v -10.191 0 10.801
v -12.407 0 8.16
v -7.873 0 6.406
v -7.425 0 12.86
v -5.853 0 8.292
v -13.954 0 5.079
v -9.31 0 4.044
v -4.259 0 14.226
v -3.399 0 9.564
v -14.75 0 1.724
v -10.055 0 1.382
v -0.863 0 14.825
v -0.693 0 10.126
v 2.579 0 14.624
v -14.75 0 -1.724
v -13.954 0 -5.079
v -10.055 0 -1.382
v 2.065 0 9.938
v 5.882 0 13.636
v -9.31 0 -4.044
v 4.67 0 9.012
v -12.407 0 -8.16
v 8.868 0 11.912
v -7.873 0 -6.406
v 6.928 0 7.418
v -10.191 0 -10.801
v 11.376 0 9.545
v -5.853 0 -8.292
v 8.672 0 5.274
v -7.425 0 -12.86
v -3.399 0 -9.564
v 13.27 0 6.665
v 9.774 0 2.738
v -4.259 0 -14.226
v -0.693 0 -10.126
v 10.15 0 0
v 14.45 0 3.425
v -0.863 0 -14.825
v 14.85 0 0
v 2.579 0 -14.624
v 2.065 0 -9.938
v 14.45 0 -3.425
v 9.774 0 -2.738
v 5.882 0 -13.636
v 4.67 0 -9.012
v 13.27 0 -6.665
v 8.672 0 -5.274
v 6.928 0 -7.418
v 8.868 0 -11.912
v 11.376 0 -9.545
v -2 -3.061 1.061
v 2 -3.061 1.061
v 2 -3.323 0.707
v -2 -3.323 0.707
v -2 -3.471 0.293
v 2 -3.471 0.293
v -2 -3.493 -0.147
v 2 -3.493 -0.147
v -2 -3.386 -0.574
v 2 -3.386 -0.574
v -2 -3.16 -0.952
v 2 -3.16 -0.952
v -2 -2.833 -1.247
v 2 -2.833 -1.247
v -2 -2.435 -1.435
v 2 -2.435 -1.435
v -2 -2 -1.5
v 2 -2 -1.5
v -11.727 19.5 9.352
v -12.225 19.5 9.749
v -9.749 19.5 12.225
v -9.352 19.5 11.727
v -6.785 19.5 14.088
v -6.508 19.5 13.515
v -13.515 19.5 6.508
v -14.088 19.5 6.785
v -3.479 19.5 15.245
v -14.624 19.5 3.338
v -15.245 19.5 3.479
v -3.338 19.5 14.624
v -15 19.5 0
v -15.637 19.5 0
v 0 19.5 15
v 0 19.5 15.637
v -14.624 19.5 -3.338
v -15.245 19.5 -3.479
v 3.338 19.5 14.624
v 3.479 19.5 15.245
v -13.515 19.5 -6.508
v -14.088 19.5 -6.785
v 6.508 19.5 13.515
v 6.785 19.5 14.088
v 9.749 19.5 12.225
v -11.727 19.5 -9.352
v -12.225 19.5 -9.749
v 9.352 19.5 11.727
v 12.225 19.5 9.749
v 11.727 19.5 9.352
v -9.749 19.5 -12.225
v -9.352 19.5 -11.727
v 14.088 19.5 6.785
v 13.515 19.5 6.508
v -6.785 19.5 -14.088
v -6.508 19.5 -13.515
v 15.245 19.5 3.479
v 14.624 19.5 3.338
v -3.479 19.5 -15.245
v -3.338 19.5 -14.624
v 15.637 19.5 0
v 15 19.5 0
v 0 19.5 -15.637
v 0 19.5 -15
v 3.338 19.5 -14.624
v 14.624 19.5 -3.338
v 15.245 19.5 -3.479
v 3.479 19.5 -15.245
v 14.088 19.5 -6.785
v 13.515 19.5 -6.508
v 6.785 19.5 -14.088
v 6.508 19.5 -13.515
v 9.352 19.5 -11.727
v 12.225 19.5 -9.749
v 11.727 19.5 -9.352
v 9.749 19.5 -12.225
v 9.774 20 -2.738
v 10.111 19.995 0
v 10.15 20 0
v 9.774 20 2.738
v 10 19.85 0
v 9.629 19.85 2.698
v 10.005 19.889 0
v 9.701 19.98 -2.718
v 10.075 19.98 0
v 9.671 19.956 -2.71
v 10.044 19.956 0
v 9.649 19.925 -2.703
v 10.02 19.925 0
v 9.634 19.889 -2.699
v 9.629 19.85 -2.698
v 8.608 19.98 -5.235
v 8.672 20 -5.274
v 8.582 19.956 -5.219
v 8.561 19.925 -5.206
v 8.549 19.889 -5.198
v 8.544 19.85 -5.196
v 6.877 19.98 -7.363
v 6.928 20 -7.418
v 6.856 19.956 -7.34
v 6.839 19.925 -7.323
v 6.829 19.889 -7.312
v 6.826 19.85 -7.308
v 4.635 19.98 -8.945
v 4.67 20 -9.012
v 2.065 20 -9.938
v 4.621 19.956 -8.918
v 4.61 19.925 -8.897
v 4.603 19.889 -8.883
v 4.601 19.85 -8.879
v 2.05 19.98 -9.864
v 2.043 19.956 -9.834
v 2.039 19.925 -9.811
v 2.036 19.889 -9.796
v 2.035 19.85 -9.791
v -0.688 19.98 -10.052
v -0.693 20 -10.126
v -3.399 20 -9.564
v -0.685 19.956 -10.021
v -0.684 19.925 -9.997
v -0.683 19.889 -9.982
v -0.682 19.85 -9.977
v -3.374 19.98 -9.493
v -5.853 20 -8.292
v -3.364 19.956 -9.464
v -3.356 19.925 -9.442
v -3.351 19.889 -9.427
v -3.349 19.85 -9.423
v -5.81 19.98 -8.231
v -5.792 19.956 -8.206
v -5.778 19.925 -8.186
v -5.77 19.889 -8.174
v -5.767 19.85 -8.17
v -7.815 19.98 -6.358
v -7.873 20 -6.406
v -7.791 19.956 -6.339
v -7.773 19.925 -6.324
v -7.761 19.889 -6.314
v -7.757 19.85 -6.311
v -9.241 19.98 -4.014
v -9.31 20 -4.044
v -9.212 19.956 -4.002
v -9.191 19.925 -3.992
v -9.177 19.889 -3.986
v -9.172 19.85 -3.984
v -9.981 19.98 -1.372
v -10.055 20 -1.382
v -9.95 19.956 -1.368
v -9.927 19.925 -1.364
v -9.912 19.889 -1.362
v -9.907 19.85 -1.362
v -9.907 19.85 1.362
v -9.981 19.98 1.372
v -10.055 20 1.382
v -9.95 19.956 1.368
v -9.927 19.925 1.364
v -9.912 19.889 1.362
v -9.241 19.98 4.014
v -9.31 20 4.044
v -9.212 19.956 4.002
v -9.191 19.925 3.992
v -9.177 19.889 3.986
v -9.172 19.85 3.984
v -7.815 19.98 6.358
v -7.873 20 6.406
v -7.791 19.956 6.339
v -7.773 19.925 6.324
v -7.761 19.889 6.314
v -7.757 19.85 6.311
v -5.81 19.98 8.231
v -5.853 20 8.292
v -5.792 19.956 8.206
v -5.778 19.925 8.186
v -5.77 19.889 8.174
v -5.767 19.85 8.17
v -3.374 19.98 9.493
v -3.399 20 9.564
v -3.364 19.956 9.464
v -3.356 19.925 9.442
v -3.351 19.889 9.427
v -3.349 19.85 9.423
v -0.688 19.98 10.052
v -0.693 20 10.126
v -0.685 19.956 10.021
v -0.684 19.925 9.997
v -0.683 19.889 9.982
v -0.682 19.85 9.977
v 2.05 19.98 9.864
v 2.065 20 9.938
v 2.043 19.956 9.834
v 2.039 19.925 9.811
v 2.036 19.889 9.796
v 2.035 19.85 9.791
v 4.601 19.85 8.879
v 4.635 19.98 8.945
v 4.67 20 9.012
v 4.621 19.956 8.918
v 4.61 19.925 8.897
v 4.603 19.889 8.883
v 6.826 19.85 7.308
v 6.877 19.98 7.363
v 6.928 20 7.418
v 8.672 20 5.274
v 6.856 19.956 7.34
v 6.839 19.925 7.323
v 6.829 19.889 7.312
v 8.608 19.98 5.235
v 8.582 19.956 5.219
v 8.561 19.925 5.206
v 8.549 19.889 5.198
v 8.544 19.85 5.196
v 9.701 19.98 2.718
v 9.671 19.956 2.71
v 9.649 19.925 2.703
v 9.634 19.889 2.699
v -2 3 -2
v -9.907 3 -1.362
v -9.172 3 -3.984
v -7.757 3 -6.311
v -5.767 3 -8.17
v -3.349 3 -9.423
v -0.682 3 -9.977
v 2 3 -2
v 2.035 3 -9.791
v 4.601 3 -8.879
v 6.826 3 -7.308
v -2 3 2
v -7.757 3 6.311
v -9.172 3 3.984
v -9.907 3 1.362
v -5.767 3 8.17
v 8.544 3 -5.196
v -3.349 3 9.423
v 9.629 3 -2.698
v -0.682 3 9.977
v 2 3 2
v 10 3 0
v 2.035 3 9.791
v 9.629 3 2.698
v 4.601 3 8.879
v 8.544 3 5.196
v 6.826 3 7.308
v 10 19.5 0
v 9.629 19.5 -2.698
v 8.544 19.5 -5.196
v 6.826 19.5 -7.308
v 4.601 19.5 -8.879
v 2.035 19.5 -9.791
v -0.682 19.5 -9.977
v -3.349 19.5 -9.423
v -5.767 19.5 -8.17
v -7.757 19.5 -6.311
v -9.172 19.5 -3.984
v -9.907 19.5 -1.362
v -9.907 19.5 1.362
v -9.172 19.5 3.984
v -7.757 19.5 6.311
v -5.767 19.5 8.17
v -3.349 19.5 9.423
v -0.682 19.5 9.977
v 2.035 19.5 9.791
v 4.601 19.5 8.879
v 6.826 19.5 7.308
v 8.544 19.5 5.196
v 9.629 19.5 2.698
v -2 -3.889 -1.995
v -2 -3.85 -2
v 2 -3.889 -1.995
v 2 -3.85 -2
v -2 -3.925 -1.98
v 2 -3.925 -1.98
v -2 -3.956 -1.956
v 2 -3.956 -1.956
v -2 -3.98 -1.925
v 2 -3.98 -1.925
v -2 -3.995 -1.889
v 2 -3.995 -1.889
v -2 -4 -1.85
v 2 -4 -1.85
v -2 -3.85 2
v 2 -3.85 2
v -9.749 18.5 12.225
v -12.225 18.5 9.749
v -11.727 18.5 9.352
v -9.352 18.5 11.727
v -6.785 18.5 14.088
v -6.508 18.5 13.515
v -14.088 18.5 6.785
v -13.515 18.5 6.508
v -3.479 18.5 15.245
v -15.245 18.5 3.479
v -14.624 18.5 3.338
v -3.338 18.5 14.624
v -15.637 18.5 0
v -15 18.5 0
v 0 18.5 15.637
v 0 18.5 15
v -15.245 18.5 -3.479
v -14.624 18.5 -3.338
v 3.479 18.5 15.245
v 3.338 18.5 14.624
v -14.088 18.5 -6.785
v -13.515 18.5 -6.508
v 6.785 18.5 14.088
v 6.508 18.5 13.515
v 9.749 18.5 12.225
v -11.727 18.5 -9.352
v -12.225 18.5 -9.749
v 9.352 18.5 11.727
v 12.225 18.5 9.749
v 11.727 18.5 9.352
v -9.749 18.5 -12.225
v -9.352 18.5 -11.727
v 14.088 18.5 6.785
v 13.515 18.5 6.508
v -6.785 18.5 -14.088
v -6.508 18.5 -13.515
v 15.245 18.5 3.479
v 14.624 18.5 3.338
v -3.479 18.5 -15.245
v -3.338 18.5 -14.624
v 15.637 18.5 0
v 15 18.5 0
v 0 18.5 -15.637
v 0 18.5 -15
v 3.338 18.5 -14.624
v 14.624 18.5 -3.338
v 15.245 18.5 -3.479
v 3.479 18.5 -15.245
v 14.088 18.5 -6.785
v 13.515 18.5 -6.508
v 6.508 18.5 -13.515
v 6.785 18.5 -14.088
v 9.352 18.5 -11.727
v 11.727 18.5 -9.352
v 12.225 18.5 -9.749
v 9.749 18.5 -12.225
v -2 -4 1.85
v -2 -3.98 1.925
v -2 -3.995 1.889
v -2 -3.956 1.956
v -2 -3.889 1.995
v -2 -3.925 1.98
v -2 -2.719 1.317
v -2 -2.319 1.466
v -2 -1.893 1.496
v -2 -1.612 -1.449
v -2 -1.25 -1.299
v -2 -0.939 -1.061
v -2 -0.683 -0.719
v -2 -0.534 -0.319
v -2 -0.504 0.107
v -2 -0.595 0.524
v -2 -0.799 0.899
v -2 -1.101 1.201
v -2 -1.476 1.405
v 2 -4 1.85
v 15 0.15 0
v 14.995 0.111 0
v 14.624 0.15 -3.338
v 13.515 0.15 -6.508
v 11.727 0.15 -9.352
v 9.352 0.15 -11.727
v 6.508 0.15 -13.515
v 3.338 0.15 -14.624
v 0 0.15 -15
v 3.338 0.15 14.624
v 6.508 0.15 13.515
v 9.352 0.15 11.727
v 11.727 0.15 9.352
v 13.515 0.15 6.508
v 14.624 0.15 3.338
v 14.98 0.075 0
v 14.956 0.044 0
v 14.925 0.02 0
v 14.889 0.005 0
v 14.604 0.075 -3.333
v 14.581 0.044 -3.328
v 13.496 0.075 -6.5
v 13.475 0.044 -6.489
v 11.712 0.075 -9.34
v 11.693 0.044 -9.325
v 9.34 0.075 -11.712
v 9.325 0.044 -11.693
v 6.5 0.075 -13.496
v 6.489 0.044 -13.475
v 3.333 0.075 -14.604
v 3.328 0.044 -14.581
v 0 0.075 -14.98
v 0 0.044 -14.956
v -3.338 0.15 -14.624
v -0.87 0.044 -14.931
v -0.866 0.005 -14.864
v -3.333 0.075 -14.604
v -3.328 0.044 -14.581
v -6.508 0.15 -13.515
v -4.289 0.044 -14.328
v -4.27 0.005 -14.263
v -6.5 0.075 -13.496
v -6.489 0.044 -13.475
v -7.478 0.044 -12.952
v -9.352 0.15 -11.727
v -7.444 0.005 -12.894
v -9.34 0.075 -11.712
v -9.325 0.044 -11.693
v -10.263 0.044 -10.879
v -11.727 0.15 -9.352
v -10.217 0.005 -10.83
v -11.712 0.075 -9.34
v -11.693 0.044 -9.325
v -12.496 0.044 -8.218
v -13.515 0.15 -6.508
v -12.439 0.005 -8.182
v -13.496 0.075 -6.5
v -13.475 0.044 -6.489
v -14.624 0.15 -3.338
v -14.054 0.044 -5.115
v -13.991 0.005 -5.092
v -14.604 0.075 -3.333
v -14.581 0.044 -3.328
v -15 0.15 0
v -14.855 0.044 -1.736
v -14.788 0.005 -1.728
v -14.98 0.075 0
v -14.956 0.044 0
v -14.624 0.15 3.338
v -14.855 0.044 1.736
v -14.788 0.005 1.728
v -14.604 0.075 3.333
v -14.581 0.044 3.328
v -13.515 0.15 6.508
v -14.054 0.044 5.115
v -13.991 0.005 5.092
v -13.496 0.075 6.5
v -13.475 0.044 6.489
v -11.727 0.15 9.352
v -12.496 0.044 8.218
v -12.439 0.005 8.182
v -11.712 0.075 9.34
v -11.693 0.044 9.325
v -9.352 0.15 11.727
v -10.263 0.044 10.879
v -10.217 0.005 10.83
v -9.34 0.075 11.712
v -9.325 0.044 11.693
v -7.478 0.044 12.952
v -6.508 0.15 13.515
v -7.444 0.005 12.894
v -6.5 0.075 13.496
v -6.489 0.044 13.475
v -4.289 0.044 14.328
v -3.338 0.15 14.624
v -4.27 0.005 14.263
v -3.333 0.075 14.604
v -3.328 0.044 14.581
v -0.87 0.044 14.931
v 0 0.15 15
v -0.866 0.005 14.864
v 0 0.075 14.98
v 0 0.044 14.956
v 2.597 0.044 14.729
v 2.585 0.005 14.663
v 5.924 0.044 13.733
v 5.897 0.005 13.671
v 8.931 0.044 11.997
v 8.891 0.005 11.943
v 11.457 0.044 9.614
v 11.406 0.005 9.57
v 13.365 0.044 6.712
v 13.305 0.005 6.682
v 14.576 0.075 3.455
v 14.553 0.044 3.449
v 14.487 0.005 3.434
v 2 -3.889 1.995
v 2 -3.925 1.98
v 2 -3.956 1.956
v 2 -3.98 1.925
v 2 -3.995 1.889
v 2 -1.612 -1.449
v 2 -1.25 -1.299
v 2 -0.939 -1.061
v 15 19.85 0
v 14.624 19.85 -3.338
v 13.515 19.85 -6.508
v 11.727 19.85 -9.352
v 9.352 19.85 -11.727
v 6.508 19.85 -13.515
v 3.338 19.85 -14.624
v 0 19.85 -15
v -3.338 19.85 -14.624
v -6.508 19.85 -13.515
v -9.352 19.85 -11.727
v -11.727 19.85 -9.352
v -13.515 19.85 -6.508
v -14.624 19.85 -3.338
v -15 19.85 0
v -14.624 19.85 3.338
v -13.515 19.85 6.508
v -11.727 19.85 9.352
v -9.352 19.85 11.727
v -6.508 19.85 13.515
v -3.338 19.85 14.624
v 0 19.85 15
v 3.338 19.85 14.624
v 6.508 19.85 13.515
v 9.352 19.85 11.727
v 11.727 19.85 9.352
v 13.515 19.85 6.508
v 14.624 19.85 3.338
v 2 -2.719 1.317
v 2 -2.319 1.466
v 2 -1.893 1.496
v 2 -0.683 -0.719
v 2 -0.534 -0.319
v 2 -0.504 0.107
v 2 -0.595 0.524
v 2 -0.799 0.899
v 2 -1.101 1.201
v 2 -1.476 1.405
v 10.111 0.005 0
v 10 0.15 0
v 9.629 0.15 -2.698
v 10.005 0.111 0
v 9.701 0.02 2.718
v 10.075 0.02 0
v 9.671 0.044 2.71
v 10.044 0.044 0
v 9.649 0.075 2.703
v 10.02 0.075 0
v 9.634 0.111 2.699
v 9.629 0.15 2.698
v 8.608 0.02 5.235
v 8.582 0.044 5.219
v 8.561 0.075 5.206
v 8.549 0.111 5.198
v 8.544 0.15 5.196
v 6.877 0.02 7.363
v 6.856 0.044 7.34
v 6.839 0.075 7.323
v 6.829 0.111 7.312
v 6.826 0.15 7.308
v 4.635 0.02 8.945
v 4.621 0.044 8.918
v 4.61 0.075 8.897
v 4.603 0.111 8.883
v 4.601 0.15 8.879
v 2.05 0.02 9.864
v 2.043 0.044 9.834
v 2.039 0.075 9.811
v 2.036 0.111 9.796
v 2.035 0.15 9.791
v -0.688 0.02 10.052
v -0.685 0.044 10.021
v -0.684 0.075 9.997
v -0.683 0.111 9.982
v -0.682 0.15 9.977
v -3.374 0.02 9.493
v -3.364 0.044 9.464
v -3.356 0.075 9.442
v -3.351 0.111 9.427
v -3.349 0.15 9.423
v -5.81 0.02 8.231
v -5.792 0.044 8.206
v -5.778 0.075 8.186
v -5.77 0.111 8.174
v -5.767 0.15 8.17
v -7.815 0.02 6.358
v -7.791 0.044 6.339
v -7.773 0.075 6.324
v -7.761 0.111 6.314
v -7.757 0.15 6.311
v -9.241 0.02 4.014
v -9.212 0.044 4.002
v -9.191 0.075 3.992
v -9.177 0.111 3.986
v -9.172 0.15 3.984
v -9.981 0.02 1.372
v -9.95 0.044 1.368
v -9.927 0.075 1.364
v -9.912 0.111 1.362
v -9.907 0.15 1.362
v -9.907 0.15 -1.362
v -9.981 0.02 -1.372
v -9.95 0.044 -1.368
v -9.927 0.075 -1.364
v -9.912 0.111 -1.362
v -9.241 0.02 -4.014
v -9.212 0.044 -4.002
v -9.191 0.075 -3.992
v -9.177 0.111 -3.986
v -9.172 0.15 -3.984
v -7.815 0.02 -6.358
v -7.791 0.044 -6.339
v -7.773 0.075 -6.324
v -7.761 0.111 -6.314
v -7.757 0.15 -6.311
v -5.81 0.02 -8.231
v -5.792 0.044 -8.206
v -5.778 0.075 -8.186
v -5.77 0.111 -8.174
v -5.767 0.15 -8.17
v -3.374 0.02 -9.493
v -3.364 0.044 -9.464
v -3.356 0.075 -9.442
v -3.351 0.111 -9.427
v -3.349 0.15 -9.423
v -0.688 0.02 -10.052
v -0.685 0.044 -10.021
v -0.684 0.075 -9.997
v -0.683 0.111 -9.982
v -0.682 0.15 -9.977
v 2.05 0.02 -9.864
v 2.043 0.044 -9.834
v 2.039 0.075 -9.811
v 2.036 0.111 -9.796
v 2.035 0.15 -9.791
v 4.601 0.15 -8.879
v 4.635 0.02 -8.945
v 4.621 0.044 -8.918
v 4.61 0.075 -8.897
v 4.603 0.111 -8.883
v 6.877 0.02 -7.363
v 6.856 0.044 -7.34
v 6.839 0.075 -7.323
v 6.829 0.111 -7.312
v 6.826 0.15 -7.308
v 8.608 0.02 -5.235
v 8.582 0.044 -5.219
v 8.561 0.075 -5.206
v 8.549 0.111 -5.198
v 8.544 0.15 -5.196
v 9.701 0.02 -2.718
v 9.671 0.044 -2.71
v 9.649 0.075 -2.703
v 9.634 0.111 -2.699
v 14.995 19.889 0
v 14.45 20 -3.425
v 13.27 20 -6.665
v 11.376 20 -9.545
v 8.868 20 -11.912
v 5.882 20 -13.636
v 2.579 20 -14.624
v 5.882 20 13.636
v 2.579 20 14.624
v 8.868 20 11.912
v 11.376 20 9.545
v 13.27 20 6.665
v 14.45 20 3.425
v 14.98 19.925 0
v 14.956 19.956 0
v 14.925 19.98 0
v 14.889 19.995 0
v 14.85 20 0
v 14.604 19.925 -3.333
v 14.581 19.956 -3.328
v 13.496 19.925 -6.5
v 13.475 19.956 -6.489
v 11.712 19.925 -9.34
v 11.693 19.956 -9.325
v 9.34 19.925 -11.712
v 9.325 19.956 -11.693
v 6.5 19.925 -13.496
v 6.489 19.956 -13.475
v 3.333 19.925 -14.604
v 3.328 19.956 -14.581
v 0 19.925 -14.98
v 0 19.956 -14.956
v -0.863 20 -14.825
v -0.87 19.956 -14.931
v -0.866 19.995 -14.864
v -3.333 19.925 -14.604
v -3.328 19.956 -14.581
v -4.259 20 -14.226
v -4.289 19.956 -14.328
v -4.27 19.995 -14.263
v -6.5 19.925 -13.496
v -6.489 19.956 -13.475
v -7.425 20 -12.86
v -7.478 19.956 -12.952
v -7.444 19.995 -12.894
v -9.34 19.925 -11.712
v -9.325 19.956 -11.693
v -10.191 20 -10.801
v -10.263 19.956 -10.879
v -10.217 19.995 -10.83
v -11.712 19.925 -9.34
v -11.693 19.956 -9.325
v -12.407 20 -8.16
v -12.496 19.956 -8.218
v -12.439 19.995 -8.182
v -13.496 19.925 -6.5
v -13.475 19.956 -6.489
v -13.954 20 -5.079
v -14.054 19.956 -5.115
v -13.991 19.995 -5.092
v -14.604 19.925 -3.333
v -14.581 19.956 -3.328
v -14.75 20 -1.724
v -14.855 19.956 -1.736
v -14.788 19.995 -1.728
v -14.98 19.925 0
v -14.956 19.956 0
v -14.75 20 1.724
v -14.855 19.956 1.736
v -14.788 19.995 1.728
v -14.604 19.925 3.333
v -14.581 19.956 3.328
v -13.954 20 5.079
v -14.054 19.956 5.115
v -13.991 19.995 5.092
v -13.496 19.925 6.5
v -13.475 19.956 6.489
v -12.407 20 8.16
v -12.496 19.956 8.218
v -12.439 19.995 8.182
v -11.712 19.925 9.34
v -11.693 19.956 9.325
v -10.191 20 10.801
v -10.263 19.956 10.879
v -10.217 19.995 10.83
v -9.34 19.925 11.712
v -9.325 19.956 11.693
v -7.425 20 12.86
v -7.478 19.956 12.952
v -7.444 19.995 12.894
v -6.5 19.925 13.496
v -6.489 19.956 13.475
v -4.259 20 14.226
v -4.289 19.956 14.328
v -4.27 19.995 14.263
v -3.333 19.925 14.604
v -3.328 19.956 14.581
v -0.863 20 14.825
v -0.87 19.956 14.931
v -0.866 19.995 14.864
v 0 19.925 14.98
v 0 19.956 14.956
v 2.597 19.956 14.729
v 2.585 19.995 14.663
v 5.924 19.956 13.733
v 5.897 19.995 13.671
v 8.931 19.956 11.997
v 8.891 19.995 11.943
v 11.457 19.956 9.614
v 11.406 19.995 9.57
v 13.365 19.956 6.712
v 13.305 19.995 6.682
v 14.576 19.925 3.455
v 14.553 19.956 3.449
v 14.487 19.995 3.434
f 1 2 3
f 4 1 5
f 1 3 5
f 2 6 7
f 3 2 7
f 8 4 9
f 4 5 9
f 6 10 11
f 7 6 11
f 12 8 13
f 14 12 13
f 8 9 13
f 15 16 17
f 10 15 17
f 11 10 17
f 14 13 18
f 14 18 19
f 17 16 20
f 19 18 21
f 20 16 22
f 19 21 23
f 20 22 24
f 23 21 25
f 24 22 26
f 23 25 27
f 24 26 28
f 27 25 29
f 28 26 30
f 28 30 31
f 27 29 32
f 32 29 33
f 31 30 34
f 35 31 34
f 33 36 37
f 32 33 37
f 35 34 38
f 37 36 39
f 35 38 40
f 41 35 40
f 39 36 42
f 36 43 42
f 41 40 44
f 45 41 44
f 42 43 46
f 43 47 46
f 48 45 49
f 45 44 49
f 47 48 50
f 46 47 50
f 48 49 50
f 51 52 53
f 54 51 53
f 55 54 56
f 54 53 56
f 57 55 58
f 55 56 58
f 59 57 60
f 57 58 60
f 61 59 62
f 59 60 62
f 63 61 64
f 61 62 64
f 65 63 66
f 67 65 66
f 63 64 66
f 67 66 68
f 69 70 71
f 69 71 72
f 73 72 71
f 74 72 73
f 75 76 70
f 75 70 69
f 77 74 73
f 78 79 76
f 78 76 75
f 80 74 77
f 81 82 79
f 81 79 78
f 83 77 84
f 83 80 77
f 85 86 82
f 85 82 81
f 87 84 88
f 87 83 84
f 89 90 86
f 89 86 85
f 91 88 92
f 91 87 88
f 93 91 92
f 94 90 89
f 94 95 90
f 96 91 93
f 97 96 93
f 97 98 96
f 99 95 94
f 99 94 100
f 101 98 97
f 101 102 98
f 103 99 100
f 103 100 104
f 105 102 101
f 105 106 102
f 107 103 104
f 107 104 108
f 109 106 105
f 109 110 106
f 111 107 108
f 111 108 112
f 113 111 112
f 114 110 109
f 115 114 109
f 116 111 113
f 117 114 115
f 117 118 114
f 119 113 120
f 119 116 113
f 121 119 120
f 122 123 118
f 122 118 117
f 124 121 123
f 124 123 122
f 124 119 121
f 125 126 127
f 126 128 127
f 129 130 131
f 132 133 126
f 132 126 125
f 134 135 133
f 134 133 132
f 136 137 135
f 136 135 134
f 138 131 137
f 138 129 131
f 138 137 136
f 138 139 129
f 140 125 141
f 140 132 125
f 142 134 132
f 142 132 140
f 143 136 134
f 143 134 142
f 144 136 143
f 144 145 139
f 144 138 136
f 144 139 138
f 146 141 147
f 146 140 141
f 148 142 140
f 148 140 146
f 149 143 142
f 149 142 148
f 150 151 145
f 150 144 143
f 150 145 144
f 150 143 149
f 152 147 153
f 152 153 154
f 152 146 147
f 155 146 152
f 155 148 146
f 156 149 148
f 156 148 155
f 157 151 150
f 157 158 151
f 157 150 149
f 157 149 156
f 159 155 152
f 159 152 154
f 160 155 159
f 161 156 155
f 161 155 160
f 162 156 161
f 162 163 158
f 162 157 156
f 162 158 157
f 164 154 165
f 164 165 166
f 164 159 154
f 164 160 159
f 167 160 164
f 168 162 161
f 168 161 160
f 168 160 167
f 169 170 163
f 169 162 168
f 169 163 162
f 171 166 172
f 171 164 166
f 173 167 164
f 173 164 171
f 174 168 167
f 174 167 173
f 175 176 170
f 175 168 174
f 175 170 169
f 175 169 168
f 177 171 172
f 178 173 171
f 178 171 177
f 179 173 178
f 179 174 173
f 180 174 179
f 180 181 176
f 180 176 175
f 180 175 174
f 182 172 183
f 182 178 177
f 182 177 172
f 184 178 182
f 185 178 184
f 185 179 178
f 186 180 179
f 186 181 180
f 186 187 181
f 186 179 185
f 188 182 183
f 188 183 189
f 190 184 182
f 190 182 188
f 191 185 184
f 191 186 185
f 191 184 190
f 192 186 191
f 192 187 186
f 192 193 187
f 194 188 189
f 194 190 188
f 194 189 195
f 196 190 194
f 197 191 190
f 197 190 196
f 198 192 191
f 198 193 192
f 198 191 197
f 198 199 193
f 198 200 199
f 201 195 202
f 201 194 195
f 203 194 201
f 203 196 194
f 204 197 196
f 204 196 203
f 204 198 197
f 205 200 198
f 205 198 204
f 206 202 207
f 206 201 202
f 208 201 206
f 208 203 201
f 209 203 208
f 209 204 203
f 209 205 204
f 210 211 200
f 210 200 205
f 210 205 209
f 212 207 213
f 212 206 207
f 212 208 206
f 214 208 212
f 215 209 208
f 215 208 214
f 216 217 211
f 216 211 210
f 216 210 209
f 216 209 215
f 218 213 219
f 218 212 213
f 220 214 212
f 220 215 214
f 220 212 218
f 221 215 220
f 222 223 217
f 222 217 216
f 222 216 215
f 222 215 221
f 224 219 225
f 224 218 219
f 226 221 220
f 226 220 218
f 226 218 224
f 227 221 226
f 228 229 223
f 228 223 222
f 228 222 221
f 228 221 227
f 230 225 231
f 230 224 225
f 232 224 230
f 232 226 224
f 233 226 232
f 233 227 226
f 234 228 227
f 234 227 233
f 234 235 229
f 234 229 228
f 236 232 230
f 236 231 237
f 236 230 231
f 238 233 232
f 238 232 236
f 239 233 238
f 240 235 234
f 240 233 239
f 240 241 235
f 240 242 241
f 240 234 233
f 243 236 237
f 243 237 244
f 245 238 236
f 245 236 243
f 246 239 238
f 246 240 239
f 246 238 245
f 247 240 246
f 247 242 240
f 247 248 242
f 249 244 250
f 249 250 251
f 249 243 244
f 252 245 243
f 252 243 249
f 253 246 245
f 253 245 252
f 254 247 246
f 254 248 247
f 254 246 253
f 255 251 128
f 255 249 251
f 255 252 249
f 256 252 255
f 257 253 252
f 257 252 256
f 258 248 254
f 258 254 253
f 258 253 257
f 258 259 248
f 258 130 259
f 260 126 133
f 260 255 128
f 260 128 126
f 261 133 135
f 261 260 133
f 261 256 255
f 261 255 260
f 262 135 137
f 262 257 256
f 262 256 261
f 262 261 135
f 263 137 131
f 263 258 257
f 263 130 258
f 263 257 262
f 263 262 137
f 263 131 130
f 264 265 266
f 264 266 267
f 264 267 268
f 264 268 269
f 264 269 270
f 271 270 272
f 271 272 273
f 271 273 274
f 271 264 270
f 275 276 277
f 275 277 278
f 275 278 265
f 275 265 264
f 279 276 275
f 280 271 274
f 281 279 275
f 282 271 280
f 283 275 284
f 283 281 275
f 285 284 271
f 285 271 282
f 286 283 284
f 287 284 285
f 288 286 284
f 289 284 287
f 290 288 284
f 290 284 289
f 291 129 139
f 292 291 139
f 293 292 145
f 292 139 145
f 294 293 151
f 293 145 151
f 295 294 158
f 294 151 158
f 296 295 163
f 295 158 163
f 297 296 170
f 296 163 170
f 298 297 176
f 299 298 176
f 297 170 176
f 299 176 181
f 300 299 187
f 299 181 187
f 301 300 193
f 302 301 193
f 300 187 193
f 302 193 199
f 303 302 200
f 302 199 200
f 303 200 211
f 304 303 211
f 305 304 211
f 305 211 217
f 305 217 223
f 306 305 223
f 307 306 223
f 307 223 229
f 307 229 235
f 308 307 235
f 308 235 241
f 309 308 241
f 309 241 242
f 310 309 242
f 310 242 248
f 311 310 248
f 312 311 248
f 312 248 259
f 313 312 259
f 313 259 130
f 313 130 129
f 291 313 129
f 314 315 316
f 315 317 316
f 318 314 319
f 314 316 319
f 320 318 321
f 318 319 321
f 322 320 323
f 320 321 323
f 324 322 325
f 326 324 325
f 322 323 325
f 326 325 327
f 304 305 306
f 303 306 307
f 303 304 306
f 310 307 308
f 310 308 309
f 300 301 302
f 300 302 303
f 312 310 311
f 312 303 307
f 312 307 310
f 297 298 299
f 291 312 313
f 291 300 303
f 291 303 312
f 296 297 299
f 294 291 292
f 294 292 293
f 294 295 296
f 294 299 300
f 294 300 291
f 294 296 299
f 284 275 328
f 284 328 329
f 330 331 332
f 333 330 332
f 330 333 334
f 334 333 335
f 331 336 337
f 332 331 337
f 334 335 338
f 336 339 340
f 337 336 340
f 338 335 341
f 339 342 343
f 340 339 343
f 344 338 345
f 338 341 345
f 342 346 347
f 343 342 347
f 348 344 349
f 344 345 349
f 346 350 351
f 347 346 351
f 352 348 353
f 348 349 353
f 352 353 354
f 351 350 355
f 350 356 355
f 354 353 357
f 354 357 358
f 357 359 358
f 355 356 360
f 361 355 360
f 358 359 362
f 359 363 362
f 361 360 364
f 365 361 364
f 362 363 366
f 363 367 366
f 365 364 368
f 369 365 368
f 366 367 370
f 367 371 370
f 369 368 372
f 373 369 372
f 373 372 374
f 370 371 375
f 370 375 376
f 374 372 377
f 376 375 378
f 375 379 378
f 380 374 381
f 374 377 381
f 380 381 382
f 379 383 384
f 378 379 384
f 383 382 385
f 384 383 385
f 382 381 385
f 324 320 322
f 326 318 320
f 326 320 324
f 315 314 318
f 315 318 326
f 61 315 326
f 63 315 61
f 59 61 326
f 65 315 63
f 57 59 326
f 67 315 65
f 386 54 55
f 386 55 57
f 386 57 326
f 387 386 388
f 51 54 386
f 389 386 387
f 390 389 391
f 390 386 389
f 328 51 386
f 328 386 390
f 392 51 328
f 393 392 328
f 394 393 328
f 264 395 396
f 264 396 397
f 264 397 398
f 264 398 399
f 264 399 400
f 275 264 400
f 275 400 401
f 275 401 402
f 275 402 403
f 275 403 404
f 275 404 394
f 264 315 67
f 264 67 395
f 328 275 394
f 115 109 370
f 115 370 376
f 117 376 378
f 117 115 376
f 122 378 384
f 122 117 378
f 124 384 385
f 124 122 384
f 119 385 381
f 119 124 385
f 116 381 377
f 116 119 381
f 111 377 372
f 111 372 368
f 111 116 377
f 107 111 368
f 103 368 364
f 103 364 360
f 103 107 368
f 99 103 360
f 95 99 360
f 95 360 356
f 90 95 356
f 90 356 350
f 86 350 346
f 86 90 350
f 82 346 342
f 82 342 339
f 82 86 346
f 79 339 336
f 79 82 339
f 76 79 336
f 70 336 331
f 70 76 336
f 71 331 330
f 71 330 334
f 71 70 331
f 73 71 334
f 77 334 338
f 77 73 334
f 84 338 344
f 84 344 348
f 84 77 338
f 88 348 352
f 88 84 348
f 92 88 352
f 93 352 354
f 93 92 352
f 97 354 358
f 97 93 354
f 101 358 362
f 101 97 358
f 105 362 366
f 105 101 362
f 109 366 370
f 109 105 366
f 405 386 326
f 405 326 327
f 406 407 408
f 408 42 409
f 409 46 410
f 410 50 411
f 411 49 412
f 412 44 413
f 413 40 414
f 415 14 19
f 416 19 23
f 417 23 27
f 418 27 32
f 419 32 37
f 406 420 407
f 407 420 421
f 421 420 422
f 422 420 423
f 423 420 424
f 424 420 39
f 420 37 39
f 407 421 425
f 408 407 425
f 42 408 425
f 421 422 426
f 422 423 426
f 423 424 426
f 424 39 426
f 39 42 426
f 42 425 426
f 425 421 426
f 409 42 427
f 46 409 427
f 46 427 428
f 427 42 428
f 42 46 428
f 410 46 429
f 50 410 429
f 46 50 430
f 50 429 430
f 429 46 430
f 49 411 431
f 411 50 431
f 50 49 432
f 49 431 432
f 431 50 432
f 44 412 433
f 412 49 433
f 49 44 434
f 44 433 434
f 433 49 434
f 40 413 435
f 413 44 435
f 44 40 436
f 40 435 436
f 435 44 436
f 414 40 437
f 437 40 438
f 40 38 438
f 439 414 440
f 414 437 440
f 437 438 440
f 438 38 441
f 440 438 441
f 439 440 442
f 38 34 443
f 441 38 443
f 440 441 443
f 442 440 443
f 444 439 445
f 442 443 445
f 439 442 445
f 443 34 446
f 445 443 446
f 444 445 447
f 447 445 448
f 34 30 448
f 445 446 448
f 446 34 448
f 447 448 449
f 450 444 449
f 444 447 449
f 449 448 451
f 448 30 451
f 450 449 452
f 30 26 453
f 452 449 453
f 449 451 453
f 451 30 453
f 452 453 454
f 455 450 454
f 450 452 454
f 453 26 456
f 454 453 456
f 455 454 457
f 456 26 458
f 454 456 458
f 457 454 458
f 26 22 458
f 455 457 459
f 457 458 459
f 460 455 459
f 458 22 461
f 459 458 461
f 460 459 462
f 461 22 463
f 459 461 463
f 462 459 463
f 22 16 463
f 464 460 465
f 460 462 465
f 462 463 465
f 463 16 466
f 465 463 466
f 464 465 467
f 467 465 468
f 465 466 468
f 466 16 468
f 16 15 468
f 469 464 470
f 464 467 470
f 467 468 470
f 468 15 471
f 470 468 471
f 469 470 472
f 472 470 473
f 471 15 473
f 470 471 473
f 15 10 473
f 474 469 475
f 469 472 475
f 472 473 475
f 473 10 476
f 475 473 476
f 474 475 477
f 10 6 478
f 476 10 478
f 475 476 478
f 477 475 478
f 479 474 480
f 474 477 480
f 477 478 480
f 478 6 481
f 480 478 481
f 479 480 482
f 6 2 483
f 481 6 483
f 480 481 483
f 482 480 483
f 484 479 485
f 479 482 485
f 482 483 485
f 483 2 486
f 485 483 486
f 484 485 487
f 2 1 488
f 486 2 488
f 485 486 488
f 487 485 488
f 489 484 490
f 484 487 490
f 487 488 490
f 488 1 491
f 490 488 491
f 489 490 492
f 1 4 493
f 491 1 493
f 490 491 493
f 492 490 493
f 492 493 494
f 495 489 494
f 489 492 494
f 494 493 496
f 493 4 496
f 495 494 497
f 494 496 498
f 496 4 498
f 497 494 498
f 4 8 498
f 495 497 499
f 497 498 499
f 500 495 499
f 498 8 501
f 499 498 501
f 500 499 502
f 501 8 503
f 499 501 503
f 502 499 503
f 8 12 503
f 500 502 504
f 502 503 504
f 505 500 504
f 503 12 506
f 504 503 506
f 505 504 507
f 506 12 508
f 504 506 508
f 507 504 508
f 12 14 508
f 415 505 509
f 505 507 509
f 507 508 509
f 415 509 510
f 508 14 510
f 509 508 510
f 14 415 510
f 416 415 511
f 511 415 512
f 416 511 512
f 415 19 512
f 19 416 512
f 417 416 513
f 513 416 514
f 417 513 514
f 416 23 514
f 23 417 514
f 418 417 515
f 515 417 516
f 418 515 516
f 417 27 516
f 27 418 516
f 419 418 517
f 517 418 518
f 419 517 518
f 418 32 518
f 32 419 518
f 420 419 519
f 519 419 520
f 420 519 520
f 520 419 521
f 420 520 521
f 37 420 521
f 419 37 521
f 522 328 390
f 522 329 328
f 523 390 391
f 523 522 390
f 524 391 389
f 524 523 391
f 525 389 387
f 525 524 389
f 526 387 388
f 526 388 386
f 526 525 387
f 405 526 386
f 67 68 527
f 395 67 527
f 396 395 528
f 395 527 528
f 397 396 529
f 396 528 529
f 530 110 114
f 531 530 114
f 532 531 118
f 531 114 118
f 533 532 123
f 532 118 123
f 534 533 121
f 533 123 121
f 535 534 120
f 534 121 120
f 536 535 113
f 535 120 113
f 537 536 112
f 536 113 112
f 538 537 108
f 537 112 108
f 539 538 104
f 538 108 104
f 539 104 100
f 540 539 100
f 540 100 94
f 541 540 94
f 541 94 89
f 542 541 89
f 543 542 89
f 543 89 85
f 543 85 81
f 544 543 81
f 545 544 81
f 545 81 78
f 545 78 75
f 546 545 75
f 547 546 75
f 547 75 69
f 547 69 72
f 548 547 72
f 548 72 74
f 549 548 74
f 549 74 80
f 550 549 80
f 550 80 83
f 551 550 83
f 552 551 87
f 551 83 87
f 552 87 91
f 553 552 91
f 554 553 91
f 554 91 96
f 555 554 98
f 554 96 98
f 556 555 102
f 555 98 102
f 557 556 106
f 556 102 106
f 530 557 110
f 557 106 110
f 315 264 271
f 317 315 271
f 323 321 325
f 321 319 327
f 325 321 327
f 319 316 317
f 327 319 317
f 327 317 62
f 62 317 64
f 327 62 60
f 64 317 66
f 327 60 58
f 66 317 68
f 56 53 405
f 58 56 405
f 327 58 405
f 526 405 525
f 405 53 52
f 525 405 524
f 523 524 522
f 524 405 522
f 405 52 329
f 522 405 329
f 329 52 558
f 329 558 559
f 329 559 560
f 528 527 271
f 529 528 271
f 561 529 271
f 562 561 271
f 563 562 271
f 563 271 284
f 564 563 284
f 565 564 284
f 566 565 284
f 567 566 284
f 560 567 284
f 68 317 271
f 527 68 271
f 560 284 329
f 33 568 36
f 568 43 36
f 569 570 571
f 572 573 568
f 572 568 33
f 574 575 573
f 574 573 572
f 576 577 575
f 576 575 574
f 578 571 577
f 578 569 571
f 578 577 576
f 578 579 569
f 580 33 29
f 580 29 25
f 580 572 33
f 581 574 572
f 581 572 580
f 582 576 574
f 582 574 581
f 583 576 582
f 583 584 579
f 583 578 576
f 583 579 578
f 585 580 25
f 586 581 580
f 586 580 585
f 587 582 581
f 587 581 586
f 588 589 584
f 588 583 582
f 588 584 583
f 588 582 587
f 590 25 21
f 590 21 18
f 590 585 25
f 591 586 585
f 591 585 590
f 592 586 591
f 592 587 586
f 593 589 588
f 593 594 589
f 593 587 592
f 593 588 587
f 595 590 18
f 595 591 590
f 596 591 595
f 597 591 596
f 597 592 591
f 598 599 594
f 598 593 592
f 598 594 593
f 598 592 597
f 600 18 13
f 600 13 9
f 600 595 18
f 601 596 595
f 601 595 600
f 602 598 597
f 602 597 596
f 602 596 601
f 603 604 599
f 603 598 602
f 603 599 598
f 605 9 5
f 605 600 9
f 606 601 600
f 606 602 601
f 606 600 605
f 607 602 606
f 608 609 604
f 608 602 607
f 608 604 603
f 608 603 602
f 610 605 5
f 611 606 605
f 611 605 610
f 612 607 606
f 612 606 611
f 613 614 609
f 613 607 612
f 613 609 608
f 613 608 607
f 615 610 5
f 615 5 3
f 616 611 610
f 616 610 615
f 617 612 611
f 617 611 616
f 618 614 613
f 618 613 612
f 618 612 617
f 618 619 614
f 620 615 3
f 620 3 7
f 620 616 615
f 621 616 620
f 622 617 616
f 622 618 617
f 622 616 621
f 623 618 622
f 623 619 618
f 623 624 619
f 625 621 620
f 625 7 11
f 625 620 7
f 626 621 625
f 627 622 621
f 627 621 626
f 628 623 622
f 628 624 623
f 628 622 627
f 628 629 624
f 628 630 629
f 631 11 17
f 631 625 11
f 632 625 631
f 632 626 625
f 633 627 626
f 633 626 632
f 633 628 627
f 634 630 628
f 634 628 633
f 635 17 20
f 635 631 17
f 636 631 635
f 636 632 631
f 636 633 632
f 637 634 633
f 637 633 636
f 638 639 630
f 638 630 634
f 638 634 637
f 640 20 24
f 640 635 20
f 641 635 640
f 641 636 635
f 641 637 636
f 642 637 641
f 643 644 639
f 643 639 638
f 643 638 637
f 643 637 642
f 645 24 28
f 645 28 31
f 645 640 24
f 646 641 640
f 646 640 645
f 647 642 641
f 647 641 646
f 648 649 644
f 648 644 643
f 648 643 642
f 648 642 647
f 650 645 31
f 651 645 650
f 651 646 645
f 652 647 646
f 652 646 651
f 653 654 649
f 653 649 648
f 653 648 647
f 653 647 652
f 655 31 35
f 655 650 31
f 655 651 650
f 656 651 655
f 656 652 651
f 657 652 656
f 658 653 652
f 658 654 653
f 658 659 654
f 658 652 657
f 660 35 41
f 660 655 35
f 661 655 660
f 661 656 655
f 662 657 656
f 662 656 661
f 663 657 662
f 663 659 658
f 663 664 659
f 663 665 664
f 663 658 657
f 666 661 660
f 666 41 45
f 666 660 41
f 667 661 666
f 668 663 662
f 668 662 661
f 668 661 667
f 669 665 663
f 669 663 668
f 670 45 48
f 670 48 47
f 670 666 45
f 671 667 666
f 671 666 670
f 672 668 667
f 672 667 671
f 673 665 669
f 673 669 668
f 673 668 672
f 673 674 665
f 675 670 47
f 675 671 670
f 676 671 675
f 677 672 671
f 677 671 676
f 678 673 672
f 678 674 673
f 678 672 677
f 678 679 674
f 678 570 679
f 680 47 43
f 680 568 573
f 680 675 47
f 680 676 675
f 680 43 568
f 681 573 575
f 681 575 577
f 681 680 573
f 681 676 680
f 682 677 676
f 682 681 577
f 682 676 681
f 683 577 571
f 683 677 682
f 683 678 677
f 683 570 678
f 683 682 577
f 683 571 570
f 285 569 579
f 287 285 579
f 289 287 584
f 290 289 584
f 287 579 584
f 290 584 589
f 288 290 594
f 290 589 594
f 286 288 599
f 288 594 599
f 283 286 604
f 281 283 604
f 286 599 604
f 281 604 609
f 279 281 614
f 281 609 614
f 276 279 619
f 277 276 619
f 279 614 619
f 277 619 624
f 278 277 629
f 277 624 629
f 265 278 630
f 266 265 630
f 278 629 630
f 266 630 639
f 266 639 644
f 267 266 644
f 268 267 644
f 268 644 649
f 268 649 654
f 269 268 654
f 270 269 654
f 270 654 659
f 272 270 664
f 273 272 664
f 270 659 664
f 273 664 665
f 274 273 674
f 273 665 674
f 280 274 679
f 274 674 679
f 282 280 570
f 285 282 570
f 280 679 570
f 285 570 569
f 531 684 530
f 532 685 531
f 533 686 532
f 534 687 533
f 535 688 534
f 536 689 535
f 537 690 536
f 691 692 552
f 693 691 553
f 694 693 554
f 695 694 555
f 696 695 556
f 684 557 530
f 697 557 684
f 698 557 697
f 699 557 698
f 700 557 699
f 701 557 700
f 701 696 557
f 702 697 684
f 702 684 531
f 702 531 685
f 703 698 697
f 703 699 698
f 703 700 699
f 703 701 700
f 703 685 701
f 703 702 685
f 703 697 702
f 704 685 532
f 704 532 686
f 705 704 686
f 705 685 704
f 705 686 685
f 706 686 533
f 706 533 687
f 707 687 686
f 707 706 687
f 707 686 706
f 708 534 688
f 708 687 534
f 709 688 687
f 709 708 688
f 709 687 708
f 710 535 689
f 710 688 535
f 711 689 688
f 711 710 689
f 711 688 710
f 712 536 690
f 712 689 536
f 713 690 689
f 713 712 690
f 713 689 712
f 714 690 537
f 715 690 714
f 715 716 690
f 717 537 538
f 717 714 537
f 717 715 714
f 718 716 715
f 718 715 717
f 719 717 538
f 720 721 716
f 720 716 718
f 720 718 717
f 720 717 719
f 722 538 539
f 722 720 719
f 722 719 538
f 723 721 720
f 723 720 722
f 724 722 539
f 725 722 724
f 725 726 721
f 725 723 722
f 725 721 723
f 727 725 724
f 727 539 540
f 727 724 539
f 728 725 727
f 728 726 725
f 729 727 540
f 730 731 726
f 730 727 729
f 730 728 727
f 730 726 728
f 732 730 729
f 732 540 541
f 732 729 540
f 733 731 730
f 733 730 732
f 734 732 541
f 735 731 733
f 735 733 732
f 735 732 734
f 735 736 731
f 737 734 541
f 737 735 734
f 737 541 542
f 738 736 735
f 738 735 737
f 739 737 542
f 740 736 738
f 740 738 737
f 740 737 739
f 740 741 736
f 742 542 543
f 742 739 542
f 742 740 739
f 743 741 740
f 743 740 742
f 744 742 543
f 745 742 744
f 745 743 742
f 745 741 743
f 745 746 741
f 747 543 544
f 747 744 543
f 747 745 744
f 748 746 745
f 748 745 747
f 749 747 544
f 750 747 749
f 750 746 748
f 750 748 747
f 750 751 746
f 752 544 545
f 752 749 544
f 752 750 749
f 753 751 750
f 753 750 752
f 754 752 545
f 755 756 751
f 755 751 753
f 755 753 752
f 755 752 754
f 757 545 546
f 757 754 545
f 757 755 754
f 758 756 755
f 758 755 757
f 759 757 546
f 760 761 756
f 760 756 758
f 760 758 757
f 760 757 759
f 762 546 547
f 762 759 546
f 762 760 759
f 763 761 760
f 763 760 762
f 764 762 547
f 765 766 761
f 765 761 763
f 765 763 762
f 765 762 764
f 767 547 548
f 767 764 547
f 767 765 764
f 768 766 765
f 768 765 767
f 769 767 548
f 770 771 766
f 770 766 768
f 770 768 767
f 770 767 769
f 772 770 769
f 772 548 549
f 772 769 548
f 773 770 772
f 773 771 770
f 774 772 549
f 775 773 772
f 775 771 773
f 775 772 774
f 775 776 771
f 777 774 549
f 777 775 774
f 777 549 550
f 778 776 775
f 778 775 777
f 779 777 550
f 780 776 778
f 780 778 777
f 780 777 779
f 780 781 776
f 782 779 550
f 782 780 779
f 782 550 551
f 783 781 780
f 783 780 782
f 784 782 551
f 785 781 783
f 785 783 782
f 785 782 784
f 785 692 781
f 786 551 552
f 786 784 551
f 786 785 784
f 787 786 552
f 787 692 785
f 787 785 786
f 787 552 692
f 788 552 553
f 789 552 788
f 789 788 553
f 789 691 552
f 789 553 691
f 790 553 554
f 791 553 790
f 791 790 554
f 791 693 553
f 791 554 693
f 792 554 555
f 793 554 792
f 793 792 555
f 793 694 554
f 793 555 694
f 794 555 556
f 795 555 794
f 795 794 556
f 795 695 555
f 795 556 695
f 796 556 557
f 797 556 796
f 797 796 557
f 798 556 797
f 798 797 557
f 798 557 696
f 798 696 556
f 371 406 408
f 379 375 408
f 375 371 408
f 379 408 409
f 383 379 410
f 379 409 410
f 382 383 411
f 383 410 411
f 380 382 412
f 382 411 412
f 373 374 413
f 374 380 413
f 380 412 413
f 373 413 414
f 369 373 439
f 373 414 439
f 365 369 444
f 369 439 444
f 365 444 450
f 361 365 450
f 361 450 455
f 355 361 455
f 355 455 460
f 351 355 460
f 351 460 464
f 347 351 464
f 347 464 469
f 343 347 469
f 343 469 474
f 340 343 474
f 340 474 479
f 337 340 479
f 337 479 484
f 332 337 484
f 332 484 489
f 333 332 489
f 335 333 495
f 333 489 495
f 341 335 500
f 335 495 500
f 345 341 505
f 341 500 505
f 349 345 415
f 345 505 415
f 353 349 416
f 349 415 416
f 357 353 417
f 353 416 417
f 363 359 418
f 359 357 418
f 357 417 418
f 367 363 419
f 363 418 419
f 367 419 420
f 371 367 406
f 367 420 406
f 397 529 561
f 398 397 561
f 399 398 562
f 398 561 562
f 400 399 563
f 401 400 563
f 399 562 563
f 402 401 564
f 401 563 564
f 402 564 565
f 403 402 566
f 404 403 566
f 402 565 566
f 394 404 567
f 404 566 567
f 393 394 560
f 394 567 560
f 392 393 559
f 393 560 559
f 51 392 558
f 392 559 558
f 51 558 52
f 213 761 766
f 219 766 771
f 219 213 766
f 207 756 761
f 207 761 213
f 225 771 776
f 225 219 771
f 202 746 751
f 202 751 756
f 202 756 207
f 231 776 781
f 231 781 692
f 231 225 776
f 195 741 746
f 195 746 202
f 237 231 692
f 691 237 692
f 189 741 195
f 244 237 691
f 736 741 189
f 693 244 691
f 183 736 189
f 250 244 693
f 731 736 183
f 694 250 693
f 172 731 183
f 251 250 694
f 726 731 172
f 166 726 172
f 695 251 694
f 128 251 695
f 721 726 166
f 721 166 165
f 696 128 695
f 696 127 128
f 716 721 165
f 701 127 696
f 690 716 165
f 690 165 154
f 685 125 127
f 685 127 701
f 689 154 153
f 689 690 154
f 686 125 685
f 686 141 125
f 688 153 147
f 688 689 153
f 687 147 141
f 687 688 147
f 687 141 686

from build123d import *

# Parameters (mm, degrees)
IZIM1_R                     = 15
Y_KSEKLIK_EKSTR_ZYON2_DEPTH = 20
IZIM2_R                     = 10
KES_EKSTR_ZYON1_DEPTH       = 1
IZIM3_R                     = 10
KES_EKSTR_ZYON2_DEPTH       = 3
IZIM4_W                     = 4
IZIM4_H                     = 4
Y_KSEKLIK_EKSTR_ZYON3_DEPTH = 7
KES_EKSTR_ZYON3_DEPTH       = 7
RADYUS1_R                   = 0.15
Y_KSEKLIK_EKSTR_ZYON4_START = -0.5
IZIM6_R                     = 15.636710187
Y_KSEKLIK_EKSTR_ZYON4_DEPTH = 1


with BuildPart() as part:
    # Çizim1 → Yükseklik-Ekstrüzyon2 (new body)
    with BuildSketch(Plane(origin=(0, 0, 0), x_dir=(1, 0, 0), z_dir=(0, 1, 0))):
        Circle(IZIM1_R)
    extrude(amount=Y_KSEKLIK_EKSTR_ZYON2_DEPTH)

    # Çizim2 → Kes-Ekstrüzyon1 (cut)
    with BuildSketch(Plane(origin=(0, 20, 0), x_dir=(1, 0, 0), z_dir=(0, 1, 0))):
        Circle(IZIM2_R)
    extrude(amount=-KES_EKSTR_ZYON1_DEPTH, mode=Mode.SUBTRACT)

    # Çizim3 → Kes-Ekstrüzyon2 (cut)
    with BuildSketch(Plane.XZ):
        Circle(IZIM3_R)
    extrude(amount=-KES_EKSTR_ZYON2_DEPTH, mode=Mode.SUBTRACT)

    # Çizim4 → Yükseklik-Ekstrüzyon3 (add)
    with BuildSketch(Plane.XZ.offset(-3)):
        Rectangle(IZIM4_W, IZIM4_H)
    extrude(amount=Y_KSEKLIK_EKSTR_ZYON3_DEPTH)

    # Çizim5 → Kes-Ekstrüzyon3 (cut)
    with BuildSketch(Plane(origin=(2, 0, 0), x_dir=(0, 0, -1), z_dir=(1, 0, 0))):
        with BuildLine():
            ThreePointArc((1.060660172, -0.939339828), (-1.060660172, -0.939339828), (-1.060660172, -3.060660172))
            Line((-1.060660172, -3.060660172), (1.060660172, -0.939339828))
        make_face()
        with BuildLine():
            Line((1.060660172, -0.939339828), (-1.060660172, -3.060660172))
            ThreePointArc((-1.060660172, -3.060660172), (0.574025149, -3.385819299), (1.5, -2))
            ThreePointArc((1.5, -2), (1.385819299, -1.425974851), (1.060660172, -0.939339828))
        make_face()
    extrude(amount=-KES_EKSTR_ZYON3_DEPTH, mode=Mode.SUBTRACT)

    # Radyus1
    radyus1_edges = [part.edges().sort_by_distance(p)[0] for p in [
        (-10, 0, 0),
        (0, -4, 2),
        (0, -4, -2),
        (-15, 0, 0),
        (-15, 20, 0),
        (-10, 20, 0),
    ]]
    fillet(radyus1_edges, radius=RADYUS1_R)

    # Çizim6 → Yükseklik-Ekstrüzyon4 (add)
    with BuildSketch(Plane(origin=(0, 20, 0), x_dir=(1, 0, 0), z_dir=(0, 1, 0)).offset(Y_KSEKLIK_EKSTR_ZYON4_START)):
        Circle(IZIM6_R)
    extrude(amount=-Y_KSEKLIK_EKSTR_ZYON4_DEPTH)


solid = part.part
